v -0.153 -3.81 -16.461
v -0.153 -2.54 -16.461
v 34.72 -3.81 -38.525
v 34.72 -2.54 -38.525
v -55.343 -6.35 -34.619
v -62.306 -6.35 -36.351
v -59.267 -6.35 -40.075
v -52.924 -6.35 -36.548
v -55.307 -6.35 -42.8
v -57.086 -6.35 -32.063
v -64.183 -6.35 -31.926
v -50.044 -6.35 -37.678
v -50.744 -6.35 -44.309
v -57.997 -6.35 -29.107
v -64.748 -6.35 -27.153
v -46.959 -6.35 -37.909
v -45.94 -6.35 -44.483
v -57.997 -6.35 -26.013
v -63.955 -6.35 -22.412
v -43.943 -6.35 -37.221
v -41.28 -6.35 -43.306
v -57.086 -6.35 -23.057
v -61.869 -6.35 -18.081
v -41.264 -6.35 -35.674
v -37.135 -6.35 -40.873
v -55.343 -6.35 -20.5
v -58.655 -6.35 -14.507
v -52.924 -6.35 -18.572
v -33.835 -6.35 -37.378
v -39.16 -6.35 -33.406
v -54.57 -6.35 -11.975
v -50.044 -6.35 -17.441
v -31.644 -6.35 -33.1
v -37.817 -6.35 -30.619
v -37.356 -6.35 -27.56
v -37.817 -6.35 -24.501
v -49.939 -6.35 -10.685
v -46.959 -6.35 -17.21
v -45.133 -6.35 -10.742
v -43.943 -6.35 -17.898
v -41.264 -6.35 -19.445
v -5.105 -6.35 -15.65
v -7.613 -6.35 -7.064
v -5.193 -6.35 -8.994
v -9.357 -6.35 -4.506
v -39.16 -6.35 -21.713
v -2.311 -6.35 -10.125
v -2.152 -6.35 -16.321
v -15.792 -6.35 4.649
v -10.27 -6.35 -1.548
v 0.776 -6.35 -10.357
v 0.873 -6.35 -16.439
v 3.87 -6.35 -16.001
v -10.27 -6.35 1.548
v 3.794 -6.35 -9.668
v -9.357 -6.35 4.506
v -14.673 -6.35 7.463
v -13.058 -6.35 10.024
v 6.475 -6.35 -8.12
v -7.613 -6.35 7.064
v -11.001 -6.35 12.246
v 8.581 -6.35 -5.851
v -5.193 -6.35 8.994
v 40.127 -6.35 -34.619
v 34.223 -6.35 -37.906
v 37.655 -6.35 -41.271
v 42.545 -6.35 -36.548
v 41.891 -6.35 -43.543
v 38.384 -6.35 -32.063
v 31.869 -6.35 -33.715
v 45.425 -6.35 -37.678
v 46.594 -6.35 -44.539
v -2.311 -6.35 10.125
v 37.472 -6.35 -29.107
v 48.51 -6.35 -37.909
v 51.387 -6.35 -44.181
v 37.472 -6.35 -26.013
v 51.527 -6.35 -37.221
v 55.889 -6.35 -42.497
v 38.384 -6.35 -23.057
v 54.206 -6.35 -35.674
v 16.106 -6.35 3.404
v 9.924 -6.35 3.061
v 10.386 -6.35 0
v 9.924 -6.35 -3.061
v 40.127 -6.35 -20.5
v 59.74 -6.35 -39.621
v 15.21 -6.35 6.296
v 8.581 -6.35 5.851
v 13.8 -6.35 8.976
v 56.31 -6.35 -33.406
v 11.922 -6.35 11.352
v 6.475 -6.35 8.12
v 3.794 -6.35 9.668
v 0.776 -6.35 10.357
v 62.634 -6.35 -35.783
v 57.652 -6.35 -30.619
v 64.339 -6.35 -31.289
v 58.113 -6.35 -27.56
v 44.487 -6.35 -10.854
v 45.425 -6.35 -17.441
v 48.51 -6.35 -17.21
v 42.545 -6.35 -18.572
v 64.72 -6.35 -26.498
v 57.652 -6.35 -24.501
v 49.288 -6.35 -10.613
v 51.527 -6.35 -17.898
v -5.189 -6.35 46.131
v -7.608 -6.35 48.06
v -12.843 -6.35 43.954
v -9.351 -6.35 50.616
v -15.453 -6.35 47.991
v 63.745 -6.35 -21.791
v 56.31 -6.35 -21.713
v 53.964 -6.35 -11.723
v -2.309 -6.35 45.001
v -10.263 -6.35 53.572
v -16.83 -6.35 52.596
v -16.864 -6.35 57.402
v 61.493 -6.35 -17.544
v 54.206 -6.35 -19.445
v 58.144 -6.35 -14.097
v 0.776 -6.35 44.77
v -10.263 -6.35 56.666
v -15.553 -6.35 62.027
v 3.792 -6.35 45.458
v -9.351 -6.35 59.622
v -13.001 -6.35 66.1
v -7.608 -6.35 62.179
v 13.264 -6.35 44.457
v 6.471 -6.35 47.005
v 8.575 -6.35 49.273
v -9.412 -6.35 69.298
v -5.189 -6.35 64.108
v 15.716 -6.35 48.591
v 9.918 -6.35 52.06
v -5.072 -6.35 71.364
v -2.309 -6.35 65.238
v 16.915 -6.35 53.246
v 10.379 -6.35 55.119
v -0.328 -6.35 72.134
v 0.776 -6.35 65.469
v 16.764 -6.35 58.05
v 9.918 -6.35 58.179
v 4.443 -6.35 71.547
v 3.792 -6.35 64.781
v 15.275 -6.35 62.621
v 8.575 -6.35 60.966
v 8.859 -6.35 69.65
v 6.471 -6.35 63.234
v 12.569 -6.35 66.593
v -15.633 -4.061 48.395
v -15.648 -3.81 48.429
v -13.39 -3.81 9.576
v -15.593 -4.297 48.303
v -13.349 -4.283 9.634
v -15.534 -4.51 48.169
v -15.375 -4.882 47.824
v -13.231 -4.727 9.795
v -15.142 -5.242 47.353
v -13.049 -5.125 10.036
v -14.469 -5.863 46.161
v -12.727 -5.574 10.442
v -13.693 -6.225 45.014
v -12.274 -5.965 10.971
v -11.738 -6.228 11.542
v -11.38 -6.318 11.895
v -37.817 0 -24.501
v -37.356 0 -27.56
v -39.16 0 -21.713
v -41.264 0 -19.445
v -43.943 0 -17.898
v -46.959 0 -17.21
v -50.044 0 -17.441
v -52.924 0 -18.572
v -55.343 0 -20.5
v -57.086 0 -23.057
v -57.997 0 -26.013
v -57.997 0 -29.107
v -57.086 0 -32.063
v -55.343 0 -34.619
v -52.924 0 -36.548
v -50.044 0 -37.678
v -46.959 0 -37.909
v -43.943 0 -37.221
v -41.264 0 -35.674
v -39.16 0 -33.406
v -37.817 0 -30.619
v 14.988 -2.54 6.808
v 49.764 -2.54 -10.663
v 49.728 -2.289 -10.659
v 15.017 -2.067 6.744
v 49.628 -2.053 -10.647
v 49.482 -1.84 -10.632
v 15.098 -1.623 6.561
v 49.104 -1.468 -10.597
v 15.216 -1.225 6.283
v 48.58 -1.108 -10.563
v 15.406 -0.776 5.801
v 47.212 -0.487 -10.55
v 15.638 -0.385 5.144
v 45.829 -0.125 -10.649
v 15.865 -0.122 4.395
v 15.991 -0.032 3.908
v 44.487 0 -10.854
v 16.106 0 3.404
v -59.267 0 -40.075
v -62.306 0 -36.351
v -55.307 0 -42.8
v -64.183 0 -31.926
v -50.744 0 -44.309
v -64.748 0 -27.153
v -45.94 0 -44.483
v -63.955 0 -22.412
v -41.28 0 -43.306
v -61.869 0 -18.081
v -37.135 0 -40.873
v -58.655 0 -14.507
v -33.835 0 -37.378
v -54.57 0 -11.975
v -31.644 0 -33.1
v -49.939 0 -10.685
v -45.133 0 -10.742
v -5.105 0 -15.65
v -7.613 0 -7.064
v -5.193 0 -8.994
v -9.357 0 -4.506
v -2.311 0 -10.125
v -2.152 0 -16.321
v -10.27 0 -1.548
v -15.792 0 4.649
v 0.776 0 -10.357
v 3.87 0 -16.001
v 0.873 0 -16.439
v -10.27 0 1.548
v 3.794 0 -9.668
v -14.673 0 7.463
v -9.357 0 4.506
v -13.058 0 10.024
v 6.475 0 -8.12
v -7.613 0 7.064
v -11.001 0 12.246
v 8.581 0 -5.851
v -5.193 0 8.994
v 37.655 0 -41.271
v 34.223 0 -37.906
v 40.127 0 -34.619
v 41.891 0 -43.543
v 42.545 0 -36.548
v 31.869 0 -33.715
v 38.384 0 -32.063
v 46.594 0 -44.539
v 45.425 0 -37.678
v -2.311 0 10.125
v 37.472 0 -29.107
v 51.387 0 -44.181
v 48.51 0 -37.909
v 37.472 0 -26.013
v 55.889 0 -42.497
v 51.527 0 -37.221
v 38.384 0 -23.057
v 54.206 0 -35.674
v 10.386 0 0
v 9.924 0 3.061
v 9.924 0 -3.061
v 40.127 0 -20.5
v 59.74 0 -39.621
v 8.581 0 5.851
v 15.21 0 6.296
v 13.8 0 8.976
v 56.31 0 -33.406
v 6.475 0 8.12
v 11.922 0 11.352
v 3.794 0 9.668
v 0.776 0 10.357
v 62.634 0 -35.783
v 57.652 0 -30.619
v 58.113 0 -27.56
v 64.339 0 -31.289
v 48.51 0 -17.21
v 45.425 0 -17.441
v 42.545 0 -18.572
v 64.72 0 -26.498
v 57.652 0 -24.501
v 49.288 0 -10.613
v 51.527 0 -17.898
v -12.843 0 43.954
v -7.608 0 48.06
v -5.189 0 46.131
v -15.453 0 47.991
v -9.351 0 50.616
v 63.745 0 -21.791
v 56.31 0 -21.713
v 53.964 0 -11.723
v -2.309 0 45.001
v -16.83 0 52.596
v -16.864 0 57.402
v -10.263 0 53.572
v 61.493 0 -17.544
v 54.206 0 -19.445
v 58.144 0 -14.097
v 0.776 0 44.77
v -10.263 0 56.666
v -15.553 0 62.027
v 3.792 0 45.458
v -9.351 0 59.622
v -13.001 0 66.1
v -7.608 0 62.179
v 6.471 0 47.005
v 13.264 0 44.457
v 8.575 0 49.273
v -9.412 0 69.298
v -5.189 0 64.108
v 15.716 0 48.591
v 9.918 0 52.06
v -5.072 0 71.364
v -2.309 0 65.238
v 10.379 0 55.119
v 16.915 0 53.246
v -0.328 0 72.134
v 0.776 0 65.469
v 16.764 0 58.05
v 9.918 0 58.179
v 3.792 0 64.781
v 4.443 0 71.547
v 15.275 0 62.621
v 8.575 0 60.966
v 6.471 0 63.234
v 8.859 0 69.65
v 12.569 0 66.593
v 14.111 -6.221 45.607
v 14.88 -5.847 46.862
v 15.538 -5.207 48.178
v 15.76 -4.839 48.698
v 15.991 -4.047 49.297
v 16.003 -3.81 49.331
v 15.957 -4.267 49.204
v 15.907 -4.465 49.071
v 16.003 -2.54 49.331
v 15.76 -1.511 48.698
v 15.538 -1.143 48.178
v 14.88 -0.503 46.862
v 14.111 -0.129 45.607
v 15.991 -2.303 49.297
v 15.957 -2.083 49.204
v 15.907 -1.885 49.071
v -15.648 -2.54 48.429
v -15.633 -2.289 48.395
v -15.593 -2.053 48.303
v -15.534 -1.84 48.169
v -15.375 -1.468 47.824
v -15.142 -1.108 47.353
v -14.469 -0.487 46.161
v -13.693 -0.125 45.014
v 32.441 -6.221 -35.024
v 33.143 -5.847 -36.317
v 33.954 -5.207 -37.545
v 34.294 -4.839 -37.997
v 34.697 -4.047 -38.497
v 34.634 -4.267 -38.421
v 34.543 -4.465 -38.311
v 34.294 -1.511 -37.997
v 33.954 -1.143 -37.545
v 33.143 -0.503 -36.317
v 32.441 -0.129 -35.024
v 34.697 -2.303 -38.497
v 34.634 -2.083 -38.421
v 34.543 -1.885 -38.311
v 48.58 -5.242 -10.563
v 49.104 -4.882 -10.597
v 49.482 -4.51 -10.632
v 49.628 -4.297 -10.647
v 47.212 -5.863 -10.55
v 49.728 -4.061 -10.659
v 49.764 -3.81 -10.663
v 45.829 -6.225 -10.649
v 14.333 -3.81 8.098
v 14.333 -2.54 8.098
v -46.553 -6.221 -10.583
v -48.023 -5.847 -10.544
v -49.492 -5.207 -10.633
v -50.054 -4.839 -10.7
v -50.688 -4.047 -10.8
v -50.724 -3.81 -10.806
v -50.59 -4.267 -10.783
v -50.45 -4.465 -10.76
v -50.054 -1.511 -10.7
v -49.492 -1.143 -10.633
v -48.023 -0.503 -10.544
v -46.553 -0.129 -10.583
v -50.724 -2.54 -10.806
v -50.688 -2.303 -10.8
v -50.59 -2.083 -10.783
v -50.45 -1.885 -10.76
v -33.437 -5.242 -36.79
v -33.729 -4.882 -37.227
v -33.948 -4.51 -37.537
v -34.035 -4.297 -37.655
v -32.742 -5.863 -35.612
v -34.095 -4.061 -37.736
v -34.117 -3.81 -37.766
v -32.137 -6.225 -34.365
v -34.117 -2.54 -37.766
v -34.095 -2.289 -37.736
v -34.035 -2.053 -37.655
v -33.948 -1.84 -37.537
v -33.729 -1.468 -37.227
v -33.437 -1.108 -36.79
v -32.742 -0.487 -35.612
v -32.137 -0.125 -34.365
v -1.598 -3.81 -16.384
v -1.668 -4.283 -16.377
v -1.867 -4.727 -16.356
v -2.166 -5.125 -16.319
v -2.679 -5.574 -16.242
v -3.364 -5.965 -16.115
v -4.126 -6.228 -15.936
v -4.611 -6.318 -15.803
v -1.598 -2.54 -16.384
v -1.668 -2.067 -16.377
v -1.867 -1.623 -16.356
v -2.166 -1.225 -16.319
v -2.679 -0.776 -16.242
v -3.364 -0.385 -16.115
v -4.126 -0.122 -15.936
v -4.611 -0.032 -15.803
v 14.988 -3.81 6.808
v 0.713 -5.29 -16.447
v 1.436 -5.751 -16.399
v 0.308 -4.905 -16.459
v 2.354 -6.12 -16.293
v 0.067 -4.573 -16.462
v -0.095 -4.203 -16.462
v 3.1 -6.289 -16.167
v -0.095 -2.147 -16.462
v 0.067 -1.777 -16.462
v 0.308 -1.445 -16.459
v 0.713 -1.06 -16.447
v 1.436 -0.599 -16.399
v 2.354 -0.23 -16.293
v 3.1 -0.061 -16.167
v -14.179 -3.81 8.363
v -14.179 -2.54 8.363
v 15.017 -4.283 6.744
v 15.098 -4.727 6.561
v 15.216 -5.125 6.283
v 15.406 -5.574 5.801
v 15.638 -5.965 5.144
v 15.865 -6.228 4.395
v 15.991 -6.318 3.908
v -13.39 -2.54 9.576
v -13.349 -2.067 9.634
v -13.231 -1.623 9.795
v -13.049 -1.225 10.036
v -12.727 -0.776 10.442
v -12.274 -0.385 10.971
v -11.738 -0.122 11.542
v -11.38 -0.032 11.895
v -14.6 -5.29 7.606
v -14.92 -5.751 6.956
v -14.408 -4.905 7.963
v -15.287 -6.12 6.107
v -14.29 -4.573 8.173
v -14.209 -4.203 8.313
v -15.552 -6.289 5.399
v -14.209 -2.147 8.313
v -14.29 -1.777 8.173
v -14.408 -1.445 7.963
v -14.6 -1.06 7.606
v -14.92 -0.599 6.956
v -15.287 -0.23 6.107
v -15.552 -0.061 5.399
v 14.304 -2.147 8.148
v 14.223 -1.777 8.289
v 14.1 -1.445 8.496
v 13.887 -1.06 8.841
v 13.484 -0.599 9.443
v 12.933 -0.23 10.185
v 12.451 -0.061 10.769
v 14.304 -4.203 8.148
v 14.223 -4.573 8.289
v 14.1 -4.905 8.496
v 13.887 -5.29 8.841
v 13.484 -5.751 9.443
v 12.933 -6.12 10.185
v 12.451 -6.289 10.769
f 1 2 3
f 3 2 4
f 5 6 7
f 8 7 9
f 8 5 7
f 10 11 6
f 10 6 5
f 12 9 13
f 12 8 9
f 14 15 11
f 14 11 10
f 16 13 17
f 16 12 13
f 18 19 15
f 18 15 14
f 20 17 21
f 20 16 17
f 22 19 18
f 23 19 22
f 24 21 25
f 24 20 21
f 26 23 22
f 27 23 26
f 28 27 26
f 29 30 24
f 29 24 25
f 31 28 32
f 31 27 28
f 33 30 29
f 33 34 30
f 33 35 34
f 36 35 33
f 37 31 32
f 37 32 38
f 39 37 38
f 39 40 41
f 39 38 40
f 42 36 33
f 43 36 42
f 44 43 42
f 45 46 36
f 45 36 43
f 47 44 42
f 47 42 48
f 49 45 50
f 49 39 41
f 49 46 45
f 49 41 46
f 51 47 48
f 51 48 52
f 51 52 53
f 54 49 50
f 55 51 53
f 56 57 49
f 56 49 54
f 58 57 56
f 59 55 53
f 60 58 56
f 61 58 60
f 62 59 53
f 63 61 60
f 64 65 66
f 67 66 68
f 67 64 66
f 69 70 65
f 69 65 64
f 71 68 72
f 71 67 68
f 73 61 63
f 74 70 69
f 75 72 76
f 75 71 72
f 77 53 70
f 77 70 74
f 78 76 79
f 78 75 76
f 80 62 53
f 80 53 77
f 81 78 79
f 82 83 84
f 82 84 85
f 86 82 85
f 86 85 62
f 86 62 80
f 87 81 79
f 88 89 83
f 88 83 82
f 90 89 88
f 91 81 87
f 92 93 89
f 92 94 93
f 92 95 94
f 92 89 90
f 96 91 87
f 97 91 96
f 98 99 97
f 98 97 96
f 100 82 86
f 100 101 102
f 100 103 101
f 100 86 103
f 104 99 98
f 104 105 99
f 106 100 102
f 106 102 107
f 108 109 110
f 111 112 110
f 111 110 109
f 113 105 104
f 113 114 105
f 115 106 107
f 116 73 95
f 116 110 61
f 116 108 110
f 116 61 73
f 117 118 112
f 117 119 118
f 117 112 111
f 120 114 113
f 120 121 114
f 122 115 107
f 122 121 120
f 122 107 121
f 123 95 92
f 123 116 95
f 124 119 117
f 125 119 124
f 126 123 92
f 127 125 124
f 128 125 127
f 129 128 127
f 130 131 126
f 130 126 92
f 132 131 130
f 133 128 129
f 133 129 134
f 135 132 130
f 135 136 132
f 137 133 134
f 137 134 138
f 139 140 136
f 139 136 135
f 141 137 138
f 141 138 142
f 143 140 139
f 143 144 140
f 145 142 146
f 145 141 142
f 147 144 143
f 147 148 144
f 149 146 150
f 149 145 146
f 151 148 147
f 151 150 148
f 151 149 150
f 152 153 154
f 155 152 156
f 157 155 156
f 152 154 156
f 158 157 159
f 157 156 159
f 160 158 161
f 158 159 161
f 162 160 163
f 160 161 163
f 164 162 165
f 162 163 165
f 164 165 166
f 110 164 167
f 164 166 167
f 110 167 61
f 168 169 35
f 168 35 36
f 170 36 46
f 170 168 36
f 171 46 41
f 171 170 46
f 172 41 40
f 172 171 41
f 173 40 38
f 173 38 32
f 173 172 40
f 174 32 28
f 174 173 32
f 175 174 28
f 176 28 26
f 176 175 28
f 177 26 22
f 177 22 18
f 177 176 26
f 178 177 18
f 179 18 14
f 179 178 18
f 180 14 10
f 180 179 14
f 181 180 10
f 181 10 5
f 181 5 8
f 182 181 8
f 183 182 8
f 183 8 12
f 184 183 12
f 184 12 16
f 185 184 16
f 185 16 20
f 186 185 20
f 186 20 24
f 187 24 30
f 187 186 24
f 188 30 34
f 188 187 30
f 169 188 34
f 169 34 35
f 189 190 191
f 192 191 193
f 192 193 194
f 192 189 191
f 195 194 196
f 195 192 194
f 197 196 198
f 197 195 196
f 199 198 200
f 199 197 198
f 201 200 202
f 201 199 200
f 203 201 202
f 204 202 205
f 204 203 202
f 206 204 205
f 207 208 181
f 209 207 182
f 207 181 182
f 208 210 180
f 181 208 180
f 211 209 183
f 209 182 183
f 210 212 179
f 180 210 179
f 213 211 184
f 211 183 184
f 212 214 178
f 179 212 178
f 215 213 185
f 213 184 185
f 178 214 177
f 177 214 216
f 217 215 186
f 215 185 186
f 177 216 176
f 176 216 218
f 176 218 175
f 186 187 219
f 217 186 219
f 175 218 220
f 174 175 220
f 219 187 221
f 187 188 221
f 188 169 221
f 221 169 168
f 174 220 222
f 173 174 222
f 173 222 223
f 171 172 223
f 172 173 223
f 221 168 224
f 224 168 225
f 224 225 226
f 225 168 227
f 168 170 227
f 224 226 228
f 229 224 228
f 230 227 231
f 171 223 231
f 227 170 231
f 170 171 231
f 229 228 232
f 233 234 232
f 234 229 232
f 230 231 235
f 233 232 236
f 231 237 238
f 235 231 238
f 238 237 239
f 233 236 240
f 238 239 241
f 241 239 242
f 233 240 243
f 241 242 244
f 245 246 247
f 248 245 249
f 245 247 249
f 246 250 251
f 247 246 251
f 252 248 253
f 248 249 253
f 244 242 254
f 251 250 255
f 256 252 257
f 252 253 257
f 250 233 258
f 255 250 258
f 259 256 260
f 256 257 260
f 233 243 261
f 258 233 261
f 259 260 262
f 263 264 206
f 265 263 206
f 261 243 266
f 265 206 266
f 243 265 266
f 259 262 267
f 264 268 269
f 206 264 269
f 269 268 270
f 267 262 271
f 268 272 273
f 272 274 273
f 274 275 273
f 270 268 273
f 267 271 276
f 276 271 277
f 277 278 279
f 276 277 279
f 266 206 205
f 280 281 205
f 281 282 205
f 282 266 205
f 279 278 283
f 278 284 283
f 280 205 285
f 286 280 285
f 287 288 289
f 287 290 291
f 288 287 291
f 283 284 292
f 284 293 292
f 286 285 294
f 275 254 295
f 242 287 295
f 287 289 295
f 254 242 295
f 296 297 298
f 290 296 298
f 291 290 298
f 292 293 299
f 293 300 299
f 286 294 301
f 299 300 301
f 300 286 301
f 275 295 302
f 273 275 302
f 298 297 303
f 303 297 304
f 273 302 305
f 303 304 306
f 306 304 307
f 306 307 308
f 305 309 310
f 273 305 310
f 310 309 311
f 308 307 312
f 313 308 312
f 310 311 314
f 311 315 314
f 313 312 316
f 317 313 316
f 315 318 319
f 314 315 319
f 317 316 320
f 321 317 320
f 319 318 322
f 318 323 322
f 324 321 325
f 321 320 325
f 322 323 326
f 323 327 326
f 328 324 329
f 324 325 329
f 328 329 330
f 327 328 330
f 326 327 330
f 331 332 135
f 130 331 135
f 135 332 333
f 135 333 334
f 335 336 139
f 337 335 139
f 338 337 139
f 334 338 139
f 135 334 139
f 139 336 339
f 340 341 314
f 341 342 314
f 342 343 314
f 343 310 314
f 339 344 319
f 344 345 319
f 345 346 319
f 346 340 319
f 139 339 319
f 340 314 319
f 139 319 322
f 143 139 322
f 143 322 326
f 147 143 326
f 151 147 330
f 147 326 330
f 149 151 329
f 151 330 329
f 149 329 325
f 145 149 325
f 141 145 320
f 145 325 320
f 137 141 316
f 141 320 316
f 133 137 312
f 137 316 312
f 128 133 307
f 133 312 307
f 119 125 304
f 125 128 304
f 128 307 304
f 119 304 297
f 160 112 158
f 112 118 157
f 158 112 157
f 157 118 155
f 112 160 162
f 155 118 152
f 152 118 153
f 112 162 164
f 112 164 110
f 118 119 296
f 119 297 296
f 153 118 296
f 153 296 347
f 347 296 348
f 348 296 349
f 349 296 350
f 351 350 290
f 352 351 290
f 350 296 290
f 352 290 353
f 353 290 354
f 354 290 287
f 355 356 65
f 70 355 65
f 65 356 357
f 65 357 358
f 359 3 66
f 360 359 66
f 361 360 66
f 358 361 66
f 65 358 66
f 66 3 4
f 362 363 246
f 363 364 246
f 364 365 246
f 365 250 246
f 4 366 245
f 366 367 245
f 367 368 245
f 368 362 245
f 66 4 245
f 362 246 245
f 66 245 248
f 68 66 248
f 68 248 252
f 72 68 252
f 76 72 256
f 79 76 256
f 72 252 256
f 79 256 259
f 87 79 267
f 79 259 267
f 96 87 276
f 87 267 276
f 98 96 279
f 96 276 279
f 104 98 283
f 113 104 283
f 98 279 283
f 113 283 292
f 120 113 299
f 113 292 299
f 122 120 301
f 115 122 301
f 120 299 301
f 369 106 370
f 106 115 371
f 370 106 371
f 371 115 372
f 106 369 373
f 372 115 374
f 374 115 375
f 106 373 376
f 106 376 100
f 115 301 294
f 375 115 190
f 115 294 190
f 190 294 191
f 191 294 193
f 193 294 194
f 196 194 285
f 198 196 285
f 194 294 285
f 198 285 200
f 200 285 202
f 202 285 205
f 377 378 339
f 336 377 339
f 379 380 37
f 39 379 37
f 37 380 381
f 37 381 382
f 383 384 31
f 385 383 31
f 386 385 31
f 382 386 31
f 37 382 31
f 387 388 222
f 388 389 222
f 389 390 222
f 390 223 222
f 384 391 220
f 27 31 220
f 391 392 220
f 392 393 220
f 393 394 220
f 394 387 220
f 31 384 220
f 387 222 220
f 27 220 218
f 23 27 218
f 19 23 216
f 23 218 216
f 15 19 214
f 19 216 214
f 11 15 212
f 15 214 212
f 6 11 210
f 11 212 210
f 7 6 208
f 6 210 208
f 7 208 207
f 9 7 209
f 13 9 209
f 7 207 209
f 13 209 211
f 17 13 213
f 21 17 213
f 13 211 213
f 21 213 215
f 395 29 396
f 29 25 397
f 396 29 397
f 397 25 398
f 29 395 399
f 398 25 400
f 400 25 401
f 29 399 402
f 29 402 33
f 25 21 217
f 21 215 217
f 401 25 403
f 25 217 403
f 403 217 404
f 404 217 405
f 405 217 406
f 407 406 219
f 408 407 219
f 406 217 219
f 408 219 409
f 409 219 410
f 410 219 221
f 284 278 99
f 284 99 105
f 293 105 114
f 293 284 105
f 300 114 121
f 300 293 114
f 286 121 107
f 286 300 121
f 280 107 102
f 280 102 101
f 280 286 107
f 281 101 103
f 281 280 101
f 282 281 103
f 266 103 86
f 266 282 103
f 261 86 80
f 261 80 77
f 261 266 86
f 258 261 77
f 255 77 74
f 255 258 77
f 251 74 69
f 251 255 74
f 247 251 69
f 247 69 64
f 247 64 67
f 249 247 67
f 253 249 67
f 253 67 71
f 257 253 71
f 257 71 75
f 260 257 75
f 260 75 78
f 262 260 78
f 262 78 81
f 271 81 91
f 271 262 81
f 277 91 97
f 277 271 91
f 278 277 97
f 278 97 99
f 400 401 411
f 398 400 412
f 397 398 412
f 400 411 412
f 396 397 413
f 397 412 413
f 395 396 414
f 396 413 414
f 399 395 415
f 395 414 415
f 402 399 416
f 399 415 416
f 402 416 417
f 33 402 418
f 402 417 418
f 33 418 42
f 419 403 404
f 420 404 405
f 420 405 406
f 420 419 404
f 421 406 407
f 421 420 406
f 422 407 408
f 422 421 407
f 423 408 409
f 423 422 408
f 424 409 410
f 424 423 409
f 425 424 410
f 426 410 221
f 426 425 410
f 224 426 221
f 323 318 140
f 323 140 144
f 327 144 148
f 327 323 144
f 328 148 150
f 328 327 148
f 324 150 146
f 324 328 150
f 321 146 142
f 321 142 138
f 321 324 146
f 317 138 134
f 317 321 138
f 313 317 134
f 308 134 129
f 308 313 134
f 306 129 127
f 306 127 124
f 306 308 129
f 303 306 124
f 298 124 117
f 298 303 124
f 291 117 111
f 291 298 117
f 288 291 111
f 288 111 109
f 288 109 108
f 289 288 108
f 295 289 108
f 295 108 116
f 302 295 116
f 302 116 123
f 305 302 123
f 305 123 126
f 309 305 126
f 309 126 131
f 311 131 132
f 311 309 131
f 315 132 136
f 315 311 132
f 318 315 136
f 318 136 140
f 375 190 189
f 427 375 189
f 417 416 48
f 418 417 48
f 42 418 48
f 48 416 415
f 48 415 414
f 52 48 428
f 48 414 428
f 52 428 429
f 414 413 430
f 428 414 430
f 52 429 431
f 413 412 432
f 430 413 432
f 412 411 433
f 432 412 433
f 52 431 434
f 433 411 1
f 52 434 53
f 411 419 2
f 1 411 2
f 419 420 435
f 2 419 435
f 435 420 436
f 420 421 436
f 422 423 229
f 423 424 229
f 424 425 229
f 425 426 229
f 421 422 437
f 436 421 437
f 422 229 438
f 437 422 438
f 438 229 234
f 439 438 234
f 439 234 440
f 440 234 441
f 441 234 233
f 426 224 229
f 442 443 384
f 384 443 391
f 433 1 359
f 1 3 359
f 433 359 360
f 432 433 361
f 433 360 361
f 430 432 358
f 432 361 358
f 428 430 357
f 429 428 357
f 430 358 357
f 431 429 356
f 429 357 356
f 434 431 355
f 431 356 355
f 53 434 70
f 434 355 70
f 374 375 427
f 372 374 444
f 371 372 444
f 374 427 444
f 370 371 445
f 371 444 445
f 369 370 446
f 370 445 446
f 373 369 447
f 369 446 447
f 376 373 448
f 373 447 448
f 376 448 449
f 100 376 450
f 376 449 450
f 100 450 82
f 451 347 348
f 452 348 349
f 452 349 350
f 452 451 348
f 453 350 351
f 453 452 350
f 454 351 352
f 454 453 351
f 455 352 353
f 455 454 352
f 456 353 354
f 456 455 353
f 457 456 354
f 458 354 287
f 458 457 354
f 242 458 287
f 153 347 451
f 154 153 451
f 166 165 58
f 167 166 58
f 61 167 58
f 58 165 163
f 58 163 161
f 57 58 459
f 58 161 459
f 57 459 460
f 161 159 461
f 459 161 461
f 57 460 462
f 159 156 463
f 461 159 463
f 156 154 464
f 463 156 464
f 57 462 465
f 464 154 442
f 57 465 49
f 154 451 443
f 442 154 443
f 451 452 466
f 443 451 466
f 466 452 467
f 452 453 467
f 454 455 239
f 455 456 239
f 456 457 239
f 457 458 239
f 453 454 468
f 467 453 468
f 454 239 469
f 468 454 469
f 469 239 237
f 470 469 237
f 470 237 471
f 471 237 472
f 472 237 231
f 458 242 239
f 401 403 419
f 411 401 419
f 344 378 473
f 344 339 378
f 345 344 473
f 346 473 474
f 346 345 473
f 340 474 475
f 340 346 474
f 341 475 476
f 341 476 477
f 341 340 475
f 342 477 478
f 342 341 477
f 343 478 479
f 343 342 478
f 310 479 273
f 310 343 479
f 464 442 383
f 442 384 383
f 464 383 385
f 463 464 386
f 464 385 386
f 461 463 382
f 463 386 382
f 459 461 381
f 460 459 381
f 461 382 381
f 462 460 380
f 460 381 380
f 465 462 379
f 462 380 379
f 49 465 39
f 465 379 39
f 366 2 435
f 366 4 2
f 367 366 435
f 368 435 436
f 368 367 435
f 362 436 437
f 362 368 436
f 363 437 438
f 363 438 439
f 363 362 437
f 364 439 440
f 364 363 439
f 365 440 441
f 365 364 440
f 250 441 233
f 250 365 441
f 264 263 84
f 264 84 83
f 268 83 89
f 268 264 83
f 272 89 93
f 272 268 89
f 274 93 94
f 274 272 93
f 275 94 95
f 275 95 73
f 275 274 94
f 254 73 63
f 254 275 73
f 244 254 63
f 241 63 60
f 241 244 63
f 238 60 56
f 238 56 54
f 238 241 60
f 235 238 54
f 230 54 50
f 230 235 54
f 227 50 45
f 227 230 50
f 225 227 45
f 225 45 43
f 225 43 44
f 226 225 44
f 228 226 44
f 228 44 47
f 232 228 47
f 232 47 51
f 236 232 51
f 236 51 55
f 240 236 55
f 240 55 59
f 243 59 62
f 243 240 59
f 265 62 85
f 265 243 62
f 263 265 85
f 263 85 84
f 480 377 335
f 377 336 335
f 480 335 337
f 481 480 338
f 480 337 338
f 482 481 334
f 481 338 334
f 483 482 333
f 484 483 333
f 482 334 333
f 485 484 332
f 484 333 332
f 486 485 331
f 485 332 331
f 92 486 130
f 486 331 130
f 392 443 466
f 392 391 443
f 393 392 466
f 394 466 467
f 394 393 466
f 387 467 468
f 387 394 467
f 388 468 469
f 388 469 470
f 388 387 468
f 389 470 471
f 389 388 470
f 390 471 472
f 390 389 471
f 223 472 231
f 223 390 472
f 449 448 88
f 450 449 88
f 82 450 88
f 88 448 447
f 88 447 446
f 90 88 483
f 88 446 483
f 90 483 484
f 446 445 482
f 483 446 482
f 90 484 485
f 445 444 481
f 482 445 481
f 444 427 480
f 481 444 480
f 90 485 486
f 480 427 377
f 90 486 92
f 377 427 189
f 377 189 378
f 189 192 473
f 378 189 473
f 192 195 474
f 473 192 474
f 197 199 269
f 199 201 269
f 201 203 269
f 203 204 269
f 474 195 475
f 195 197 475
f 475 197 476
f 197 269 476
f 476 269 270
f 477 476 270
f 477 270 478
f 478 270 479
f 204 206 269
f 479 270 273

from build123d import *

# Parameters (mm, degrees)
F0_R     = 10.3857806341
F0_R_2   = 10.3786468128
F1_DEPTH = 6.35
F2_R     = 2.54
F3_R     = 2.54


with BuildPart() as f1:
    # F0 (on Front) → F1 (new body)
    with BuildSketch(Plane.XZ):
        with BuildLine():
            Line((14.3325142405, 8.0979142801), (16.0034097486, 49.3313107205))
            ThreePointArc((16.0034097486, 49.3313107205), (-0.4850827816, 72.1303829543), (-15.6475718809, 48.4287584328))
            Line((-15.6475718809, 48.4287584328), (-13.390063044, 9.576188794))
            ThreePointArc((-13.390063044, 9.576188794), (-13.7979919658, 8.9784518628), (-14.1792566045, 8.3633642923))
            ThreePointArc((-14.1792566045, 8.3633642923), (-14.6745633827, -7.4601856322), (-1.598191245, -16.3842291514))
            ThreePointArc((-1.598191245, -16.3842291514), (-0.876571417, -16.438637495), (-0.153257636, -16.4612785724))
            ThreePointArc((-0.153257636, -16.4612785724), (13.7979919658, -8.9784518628), (14.988254289, 6.8080403574))
            ThreePointArc((14.988254289, 6.8080403574), (14.6745633827, 7.4601856322), (14.3325142405, 8.0979142801))
        make_face()
        Circle(F0_R, mode=Mode.SUBTRACT)
        with Locations((0, 55.1193505526)):
            Circle(F0_R_2, mode=Mode.SUBTRACT)
        with BuildLine():
            Line((49.764321017, -10.66318446), (14.988254289, 6.8080403574))
            ThreePointArc((14.988254289, 6.8080403574), (13.7979919658, -8.9784518628), (-0.153257636, -16.4612785724))
            Line((-0.153257636, -16.4612785724), (34.7204634116, -38.5250147497))
            ThreePointArc((34.7204634116, -38.5250147497), (62.709285414, -35.6450974653), (49.764321017, -10.66318446))
        make_face()
        with Locations((47.7347578186, -27.5596752763)):
            Circle(F0_R_2, mode=Mode.SUBTRACT)
        with BuildLine():
            ThreePointArc((-1.598191245, -16.3842291514), (-14.6745633827, -7.4601856322), (-14.1792566045, 8.3633642923))
            Line((-14.1792566045, 8.3633642923), (-50.7238731603, -10.8062959708))
            ThreePointArc((-50.7238731603, -10.8062959708), (-62.2242026323, -36.485285489), (-34.1167491361, -37.7655739728))
            Line((-34.1167491361, -37.7655739728), (-1.598191245, -16.3842291514))
        make_face()
        with Locations((-47.7347578186, -27.5596752763)):
            Circle(F0_R_2, mode=Mode.SUBTRACT)
    extrude(amount=F1_DEPTH)

    # F2
    f2_edges = [f1.edges().sort_by_distance(p)[0] for p in [
        (15.167962, 0, 28.714613),
        (-14.518817, 0, 29.002474),
        (32.376288, 0, -1.927572),
        (17.283603, 0, -27.493147),
        (-17.85747, 0, -27.074902),
        (-32.451565, 0, -1.221466),
    ]]
    fillet(f2_edges, radius=F2_R)

    # F3
    f3_edges = [f1.edges().sort_by_distance(p)[0] for p in [
        (15.167962, -6.35, 28.714613),
        (-14.518817, -6.35, 29.002474),
        (-32.451565, -6.35, -1.221466),
        (-17.85747, -6.35, -27.074902),
        (17.283603, -6.35, -27.493147),
        (32.376288, -6.35, -1.927572),
    ]]
    fillet(f3_edges, radius=F3_R)


solid = f1.part
